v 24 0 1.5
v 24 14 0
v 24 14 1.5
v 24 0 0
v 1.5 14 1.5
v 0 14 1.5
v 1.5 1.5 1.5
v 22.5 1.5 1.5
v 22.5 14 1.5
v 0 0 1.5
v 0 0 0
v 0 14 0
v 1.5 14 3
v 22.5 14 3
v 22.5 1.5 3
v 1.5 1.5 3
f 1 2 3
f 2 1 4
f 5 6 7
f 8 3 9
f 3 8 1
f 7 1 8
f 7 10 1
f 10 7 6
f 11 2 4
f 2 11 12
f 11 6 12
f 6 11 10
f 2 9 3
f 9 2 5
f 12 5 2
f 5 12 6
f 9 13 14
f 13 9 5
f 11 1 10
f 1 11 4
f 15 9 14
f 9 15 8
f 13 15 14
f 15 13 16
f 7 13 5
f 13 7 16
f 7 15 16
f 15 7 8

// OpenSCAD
x=21;
y=17;
z=6;
pad=1;
vegg=1.5;

draw_box = 0;
draw_lid = 1;

if (draw_box) {
    difference() {
        cube([x+vegg*2,y+vegg*2,z+vegg]);
        translate([vegg,vegg,vegg]) {
            cube([x,y,z+vegg]);
        }
    }
    translate([vegg+2.5,vegg+2.5,vegg]) { cylinder(r=.8,h=1.5,$fn=50); }
    translate([x-vegg+.5,vegg+2.5,vegg]) { cylinder(r=.8,h=1.5,$fn=50); }
}

if (draw_lid) {
    translate([0,(draw_box > 0) ? -y-3 : 0, 0]) {
        cube([x+vegg*2,y-3,vegg]);
        translate([vegg,vegg,vegg]) {
            cube([x,y-3-vegg,vegg]);
        }
    }
}
